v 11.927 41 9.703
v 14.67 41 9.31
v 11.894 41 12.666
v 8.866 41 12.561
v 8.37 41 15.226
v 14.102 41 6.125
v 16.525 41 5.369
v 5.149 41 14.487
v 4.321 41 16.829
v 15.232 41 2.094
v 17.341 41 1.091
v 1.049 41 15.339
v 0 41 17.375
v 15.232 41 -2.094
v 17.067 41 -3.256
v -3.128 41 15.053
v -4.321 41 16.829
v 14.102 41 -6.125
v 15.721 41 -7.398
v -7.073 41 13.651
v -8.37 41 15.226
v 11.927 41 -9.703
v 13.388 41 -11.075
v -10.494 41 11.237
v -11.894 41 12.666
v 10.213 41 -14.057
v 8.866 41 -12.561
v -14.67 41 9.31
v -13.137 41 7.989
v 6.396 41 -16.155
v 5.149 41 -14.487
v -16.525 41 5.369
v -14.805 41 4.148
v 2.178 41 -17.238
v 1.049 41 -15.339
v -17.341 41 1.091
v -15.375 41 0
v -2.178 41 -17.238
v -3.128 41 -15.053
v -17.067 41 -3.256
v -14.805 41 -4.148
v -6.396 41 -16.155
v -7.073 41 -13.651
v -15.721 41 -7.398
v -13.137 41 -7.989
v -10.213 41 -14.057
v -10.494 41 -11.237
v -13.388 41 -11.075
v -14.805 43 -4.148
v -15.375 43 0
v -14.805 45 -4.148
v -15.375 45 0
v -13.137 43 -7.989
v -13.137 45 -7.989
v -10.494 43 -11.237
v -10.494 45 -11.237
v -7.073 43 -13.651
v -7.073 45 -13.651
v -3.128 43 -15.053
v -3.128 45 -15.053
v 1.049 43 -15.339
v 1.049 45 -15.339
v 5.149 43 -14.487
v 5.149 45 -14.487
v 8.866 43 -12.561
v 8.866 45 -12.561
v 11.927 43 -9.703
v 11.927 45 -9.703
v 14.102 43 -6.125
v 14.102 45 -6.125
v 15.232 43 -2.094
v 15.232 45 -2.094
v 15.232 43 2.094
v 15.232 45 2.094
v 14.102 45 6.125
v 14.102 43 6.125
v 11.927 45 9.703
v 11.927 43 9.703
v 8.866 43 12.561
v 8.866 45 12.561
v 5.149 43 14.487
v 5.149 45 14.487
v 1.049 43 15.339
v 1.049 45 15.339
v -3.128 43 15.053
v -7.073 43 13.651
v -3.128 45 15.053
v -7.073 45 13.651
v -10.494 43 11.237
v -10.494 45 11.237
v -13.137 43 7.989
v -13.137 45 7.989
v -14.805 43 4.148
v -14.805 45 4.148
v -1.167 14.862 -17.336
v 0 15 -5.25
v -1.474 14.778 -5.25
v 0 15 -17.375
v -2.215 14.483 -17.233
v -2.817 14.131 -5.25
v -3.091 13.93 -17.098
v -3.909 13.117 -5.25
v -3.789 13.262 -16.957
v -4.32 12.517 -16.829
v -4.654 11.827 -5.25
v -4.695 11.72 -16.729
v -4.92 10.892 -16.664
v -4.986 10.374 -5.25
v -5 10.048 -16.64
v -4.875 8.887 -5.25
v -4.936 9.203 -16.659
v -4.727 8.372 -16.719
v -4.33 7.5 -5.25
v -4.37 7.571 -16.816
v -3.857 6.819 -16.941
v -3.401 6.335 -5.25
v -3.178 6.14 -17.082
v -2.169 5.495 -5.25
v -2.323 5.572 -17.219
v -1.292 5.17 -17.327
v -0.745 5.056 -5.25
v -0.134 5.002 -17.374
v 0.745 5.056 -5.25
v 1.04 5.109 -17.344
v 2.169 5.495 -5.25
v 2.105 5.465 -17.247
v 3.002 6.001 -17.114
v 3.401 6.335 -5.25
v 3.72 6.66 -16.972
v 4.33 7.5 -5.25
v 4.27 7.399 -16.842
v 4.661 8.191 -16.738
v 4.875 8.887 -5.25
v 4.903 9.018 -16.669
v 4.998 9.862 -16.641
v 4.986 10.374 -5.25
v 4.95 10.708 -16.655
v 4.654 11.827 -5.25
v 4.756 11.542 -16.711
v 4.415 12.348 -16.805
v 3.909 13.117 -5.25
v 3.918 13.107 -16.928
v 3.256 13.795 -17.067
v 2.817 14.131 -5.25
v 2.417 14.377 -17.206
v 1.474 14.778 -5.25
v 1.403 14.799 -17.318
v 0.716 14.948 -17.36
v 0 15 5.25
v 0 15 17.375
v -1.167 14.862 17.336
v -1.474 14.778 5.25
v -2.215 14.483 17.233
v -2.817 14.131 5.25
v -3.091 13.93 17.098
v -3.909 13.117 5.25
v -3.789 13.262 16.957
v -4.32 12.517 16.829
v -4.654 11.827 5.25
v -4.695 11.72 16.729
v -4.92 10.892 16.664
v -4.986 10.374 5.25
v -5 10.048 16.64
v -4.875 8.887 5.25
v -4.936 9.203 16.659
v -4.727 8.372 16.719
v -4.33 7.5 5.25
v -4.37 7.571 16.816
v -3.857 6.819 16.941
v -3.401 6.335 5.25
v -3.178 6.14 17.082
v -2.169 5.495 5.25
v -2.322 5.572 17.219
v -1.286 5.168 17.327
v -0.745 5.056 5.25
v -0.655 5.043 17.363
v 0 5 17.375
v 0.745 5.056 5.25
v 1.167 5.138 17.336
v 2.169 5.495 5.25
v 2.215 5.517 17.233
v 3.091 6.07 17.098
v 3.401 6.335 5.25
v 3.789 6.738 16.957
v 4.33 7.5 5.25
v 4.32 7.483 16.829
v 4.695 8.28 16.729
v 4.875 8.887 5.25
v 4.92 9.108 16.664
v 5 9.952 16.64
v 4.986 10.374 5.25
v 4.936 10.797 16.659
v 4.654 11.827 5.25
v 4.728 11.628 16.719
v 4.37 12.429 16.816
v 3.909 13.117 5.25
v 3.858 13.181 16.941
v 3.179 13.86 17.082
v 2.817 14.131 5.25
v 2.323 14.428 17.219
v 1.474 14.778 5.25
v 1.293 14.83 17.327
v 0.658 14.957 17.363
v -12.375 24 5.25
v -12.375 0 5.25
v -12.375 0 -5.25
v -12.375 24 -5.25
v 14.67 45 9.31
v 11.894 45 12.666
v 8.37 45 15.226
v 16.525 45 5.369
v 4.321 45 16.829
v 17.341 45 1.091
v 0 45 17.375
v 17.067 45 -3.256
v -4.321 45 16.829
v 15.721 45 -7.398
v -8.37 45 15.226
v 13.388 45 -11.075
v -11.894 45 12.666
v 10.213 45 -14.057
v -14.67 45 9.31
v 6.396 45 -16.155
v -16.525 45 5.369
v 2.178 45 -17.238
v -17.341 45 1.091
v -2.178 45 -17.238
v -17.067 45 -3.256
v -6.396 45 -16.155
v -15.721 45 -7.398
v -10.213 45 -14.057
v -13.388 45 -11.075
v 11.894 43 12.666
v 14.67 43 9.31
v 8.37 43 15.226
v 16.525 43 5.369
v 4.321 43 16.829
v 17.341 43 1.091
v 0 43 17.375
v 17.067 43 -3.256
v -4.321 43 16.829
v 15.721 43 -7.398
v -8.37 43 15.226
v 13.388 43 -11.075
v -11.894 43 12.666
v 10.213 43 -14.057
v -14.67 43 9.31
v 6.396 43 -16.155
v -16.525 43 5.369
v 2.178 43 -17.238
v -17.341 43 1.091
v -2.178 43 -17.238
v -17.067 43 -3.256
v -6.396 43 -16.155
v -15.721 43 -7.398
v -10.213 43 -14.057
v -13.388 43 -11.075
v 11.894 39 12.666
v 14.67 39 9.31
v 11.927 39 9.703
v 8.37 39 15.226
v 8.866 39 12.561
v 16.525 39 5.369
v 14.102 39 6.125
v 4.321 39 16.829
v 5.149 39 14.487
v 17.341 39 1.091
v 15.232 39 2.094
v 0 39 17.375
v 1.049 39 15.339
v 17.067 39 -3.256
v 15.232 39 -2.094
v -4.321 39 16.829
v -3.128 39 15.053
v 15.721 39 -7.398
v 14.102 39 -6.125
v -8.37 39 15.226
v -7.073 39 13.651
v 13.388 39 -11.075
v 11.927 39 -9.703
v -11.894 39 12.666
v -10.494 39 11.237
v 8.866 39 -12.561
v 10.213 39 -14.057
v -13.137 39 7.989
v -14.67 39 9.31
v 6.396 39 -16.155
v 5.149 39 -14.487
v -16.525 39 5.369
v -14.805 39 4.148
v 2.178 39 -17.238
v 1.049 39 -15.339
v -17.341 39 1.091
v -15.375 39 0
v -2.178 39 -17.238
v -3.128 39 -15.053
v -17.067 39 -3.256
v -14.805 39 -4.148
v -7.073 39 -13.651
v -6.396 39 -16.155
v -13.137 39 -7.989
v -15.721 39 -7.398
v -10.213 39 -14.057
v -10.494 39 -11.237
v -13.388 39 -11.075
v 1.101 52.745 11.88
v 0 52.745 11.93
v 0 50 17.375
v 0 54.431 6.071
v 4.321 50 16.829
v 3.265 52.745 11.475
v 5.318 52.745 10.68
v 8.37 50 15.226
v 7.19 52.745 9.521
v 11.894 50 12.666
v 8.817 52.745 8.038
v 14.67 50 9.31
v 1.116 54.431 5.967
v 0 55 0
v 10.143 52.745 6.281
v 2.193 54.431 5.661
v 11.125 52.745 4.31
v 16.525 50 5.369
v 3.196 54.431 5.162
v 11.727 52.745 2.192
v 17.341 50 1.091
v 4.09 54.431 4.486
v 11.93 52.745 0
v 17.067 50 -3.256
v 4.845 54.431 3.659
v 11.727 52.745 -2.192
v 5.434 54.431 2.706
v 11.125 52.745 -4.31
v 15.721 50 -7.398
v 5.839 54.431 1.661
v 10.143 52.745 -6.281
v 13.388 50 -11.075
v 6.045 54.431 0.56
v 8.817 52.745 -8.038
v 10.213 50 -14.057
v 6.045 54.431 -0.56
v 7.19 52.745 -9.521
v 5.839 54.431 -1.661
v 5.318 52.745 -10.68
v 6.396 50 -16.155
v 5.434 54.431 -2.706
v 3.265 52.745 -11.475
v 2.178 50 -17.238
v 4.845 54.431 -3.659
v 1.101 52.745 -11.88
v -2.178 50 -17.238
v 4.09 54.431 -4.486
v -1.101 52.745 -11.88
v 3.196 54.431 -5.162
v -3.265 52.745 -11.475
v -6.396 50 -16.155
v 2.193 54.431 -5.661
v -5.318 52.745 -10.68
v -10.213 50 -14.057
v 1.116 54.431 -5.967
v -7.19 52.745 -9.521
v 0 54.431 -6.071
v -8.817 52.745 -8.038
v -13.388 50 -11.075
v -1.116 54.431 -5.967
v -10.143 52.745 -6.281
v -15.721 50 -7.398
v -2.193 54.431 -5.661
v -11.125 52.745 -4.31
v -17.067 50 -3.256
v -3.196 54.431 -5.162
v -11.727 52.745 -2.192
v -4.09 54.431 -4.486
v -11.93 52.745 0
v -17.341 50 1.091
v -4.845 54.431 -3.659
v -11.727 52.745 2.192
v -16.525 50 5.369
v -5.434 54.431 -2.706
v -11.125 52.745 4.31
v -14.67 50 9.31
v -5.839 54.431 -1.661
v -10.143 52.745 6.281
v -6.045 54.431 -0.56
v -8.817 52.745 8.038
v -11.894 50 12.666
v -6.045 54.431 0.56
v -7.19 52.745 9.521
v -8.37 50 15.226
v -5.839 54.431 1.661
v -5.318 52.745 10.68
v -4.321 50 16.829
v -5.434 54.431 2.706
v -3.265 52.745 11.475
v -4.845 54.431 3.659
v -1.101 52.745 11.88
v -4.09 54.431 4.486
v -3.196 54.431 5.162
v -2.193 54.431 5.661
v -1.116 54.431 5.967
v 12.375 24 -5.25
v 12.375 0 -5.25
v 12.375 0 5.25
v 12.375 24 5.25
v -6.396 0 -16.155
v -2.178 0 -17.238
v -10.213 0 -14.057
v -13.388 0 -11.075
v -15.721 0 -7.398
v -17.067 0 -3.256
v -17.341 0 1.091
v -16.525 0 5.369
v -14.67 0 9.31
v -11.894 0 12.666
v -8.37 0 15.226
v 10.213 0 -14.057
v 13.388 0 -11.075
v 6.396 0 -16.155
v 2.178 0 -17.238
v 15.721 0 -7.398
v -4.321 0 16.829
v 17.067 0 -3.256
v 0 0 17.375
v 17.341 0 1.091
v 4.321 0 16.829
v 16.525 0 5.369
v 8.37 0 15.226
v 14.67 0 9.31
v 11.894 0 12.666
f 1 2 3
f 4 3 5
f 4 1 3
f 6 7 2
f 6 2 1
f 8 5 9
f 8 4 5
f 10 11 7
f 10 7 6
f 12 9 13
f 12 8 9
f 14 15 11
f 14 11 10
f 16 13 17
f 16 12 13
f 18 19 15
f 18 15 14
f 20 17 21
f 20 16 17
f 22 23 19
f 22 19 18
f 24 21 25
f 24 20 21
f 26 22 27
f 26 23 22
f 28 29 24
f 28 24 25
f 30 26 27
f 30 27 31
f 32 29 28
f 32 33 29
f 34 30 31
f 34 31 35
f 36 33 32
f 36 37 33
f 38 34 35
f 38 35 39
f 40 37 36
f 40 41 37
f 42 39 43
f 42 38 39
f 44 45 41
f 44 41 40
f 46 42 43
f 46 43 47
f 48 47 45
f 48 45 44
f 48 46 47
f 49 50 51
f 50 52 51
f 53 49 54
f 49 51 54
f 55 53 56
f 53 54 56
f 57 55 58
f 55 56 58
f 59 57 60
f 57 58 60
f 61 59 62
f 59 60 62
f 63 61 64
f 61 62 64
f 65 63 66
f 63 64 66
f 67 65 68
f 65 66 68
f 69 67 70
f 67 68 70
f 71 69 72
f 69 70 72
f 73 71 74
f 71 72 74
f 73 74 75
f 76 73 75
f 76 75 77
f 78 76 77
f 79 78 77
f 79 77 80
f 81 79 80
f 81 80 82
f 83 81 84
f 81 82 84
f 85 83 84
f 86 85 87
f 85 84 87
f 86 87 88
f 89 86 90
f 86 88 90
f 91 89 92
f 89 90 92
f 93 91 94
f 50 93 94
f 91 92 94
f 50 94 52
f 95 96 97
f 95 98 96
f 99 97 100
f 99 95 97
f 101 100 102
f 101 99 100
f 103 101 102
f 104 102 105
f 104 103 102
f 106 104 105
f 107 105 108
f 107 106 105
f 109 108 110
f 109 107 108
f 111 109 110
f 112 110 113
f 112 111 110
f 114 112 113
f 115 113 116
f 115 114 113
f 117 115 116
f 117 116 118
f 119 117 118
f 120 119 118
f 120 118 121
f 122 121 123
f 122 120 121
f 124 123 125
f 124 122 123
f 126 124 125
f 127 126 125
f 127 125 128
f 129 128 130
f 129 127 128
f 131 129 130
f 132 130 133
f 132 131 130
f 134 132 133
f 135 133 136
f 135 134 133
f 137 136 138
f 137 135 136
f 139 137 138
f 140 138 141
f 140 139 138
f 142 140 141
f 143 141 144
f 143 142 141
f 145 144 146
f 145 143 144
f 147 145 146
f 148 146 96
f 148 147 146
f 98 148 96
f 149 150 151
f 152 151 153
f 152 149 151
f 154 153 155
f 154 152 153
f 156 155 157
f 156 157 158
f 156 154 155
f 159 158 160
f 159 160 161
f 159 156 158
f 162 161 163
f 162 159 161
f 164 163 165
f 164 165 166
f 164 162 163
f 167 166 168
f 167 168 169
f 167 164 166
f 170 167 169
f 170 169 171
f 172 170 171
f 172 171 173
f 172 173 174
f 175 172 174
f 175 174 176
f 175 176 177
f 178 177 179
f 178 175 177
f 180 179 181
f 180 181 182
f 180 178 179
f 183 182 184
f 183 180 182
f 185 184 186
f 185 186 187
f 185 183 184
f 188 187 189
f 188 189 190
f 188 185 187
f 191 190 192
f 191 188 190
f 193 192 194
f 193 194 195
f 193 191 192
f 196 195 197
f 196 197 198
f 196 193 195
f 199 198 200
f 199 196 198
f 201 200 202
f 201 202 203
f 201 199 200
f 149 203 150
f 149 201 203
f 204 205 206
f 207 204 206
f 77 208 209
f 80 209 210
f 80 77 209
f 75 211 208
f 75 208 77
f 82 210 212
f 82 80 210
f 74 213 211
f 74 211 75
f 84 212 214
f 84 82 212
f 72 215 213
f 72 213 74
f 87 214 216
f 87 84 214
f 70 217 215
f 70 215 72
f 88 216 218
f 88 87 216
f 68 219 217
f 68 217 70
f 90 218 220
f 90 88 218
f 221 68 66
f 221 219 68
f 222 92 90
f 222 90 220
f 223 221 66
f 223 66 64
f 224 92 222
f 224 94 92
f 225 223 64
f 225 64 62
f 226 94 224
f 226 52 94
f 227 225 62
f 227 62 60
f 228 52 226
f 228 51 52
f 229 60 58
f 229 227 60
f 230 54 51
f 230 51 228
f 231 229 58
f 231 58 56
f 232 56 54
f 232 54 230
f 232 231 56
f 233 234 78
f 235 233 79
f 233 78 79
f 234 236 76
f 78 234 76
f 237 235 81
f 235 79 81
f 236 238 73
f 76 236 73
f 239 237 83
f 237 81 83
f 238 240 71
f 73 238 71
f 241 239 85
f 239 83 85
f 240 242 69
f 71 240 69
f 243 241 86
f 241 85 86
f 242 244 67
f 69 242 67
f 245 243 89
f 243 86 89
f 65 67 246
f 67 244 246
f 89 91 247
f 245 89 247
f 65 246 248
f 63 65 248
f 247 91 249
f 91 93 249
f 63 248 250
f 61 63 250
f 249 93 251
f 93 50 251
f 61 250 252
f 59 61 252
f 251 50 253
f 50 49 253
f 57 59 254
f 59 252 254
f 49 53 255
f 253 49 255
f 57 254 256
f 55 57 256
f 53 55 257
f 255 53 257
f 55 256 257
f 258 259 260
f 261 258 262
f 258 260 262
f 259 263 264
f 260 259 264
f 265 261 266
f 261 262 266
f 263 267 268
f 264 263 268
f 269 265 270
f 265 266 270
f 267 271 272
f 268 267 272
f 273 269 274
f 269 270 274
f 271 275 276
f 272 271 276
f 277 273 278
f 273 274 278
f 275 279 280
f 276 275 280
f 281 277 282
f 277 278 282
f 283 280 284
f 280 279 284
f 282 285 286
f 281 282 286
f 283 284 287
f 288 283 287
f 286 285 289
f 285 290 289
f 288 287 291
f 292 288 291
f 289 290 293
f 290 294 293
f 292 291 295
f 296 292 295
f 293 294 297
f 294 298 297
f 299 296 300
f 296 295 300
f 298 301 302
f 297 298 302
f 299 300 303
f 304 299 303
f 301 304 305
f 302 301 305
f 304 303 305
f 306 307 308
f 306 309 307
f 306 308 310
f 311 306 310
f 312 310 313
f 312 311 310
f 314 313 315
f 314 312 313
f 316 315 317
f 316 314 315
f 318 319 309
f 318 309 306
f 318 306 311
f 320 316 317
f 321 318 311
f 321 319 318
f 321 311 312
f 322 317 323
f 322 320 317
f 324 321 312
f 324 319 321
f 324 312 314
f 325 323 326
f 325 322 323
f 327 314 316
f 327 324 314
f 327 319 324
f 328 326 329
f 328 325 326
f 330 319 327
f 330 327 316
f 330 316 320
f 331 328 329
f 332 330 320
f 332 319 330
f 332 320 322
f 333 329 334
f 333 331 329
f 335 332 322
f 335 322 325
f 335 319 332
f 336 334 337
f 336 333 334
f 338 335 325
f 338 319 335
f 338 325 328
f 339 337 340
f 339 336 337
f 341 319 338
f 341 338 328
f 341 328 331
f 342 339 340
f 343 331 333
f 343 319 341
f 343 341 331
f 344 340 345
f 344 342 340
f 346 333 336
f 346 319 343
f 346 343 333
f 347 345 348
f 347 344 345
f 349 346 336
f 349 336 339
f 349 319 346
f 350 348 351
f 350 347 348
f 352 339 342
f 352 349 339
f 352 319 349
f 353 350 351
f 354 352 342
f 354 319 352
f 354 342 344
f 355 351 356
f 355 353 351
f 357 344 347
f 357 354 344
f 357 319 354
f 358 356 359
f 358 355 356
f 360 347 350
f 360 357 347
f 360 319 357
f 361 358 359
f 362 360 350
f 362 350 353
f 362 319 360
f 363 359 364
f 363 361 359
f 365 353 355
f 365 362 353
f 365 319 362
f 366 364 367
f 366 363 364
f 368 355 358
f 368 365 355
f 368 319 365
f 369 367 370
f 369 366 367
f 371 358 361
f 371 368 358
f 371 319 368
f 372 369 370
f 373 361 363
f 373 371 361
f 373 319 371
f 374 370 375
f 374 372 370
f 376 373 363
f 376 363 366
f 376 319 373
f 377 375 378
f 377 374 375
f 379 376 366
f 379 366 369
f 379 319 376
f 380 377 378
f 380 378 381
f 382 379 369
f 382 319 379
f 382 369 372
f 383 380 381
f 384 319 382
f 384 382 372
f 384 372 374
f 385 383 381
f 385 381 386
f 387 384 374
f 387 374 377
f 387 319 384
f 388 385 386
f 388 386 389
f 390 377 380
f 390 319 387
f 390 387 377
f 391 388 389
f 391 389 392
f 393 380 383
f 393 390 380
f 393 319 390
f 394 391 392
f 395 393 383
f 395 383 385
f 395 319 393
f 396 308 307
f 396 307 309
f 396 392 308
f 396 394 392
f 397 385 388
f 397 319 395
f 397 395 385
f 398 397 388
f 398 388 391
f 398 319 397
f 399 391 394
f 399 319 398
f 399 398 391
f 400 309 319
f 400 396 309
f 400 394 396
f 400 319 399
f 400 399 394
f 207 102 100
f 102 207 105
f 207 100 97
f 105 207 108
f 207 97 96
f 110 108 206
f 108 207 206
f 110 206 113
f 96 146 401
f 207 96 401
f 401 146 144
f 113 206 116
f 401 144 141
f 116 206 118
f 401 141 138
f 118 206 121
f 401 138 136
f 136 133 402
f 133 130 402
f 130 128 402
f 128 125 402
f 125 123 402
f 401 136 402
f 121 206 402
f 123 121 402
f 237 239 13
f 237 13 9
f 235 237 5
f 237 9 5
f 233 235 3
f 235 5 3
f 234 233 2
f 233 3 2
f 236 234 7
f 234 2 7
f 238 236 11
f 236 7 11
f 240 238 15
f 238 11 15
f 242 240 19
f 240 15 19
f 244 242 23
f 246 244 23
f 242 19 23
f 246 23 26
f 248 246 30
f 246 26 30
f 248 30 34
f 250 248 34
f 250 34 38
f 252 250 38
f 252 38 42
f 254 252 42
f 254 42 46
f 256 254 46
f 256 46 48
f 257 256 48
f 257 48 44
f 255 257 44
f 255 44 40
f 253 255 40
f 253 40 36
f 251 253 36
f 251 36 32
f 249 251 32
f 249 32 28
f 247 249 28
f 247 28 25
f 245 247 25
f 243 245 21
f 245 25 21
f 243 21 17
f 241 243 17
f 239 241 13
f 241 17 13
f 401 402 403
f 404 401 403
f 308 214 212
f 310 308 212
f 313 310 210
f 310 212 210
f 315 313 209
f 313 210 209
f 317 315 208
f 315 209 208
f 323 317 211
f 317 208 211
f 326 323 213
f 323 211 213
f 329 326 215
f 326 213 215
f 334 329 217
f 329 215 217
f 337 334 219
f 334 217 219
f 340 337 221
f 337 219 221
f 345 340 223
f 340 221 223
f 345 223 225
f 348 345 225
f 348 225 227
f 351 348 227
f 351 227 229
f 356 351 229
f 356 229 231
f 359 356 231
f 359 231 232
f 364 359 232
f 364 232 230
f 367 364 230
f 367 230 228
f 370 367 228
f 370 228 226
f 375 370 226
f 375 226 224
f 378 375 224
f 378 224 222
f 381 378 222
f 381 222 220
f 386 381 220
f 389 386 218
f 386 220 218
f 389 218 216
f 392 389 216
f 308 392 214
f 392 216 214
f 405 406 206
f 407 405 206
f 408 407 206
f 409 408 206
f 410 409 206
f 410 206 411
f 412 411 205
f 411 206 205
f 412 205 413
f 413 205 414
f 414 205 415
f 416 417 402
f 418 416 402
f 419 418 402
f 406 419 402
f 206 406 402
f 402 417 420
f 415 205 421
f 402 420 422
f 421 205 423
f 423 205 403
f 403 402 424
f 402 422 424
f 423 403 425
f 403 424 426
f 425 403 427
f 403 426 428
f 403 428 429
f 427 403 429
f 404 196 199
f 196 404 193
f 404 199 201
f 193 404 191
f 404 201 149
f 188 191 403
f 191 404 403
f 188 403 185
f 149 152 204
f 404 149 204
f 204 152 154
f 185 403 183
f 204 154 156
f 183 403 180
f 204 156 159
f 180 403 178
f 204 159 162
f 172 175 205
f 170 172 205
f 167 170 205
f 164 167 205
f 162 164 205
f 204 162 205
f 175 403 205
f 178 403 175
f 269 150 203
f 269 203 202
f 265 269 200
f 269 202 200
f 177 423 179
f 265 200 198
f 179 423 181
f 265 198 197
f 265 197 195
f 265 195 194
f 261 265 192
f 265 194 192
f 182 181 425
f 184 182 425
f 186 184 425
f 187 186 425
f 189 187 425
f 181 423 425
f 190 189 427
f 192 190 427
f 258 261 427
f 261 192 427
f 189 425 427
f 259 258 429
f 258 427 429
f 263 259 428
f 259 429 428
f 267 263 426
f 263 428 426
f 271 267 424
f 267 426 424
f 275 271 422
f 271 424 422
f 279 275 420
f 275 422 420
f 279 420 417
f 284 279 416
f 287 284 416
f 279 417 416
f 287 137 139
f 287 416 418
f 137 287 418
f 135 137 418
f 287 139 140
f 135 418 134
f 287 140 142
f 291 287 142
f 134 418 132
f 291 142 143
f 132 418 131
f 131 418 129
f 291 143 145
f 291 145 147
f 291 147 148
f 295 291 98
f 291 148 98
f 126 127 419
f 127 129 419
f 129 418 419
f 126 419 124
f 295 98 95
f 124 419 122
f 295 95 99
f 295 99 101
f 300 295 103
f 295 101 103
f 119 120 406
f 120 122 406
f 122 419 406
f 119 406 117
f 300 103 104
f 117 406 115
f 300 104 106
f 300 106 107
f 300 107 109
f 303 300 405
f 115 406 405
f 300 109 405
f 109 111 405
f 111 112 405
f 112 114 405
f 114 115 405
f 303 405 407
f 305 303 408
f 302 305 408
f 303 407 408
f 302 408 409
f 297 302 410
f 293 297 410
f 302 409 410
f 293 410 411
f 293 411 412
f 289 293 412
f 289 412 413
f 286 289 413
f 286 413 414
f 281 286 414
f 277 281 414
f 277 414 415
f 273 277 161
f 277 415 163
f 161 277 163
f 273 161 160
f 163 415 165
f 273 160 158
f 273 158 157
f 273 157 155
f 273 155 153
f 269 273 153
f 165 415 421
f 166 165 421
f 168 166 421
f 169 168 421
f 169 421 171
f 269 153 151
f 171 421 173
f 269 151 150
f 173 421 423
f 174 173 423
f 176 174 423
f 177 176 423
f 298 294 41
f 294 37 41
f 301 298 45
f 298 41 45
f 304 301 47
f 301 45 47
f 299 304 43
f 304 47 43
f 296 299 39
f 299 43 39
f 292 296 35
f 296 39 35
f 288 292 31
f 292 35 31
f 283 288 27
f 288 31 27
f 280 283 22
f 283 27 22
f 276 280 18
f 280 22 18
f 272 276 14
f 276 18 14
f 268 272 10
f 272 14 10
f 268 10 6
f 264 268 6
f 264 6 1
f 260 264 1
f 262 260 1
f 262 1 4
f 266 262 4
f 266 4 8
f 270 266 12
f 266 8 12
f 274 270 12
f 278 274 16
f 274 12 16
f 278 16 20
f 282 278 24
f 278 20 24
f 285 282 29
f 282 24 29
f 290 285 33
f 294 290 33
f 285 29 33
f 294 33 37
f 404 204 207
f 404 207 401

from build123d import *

# Parameters (mm, degrees)
SKETCH3_R               = 17.375
BOSS_EXTRUDE1_DEPTH     = 30
SKETCH4_R               = 17.375
BOSS_EXTRUDE2_DEPTH     = 20
CUT_EXTRUDE1_DEPTH      = 61
CUT_EXTRUDE1_DEPTH_BACK = 42
SKETCH5_R               = 5
CUT_EXTRUDE3_DEPTH      = 15
SKETCH13_W              = 24.75
SKETCH13_H              = 10.5
CUT_EXTRUDE4_DEPTH      = 9
DOME1_FACE_RADIUS       = 17.375
DOME1_HEIGHT            = 5
SKETCH16_W              = 2
SKETCH16_H              = 2


with BuildPart() as part:
    # Sketch3 → Boss-Extrude1 (new body)
    with BuildSketch(Plane(origin=(0, 0, 0), x_dir=(1, 0, 0), z_dir=(0, 1, 0))):
        with Locations(Location((0, 0, 0), (0, 0, 270))):
            Circle(SKETCH3_R)
    extrude(amount=BOSS_EXTRUDE1_DEPTH)

    # Sketch4 → Boss-Extrude2 (add)
    with BuildSketch(Plane(origin=(0, 30, 0), x_dir=(1, 0, 0), z_dir=(0, 1, 0))):
        with Locations(Location((0, 0, 0), (0, 0, 270))):
            Circle(SKETCH4_R)
    extrude(amount=BOSS_EXTRUDE2_DEPTH)

    # Sketch5 → Cut-Extrude1 (cut, two sides: drawn at the far end of the back side and taken through both)
    with BuildSketch(Plane.XY.offset(-CUT_EXTRUDE1_DEPTH_BACK)):
        with Locations(Location((0, 10, 0), (0, 0, 90.000000029))):
            Circle(SKETCH5_R)
    extrude(amount=CUT_EXTRUDE1_DEPTH + CUT_EXTRUDE1_DEPTH_BACK, mode=Mode.SUBTRACT)

    # Sketch7 → Cut-Extrude3 (cut)
    with BuildSketch(Plane.XZ):
        Polygon((0, 0), (0, 5.25), (-12.375, 5.25), (-12.375, -5.25), (0, -5.25), align=None)
        Polygon((12.375, 5.25), (0, 5.25), (0, 0), (0, -5.25), (12.375, -5.25), align=None)
    extrude(amount=-CUT_EXTRUDE3_DEPTH, mode=Mode.SUBTRACT)

    # Sketch13 → Cut-Extrude4 (cut)
    with BuildSketch(Plane.XZ.offset(-15)):
        Rectangle(SKETCH13_W, SKETCH13_H)
    extrude(amount=-CUT_EXTRUDE4_DEPTH, mode=Mode.SUBTRACT)

    # Dome1: a dome of height H over a round flat face of radius A is a cap of a sphere of radius (A * A + H * H) / (2 * H)
    dome1_r = (DOME1_FACE_RADIUS * DOME1_FACE_RADIUS + DOME1_HEIGHT * DOME1_HEIGHT) / (2 * DOME1_HEIGHT)
    dome1_base = Plane((0, 50, 0), z_dir=(0, 1, 0))
    with Locations(dome1_base.offset(DOME1_HEIGHT - dome1_r)):
        dome1_ball = Sphere(dome1_r, mode=Mode.PRIVATE)
    add(split(dome1_ball, bisect_by=dome1_base, keep=Keep.TOP, mode=Mode.PRIVATE))

    # Sketch16 → Cut-Revolve2 (revolve, cut)
    with BuildSketch(Plane.XY):
        with Locations((-16.375, 44)):
            Rectangle(SKETCH16_W, SKETCH16_H)
        with Locations((-16.375, 40)):
            Rectangle(SKETCH16_W, SKETCH16_H)
    revolve(axis=Axis((0, 55, 0), (0, -1, 0)), mode=Mode.SUBTRACT)


solid = part.part
